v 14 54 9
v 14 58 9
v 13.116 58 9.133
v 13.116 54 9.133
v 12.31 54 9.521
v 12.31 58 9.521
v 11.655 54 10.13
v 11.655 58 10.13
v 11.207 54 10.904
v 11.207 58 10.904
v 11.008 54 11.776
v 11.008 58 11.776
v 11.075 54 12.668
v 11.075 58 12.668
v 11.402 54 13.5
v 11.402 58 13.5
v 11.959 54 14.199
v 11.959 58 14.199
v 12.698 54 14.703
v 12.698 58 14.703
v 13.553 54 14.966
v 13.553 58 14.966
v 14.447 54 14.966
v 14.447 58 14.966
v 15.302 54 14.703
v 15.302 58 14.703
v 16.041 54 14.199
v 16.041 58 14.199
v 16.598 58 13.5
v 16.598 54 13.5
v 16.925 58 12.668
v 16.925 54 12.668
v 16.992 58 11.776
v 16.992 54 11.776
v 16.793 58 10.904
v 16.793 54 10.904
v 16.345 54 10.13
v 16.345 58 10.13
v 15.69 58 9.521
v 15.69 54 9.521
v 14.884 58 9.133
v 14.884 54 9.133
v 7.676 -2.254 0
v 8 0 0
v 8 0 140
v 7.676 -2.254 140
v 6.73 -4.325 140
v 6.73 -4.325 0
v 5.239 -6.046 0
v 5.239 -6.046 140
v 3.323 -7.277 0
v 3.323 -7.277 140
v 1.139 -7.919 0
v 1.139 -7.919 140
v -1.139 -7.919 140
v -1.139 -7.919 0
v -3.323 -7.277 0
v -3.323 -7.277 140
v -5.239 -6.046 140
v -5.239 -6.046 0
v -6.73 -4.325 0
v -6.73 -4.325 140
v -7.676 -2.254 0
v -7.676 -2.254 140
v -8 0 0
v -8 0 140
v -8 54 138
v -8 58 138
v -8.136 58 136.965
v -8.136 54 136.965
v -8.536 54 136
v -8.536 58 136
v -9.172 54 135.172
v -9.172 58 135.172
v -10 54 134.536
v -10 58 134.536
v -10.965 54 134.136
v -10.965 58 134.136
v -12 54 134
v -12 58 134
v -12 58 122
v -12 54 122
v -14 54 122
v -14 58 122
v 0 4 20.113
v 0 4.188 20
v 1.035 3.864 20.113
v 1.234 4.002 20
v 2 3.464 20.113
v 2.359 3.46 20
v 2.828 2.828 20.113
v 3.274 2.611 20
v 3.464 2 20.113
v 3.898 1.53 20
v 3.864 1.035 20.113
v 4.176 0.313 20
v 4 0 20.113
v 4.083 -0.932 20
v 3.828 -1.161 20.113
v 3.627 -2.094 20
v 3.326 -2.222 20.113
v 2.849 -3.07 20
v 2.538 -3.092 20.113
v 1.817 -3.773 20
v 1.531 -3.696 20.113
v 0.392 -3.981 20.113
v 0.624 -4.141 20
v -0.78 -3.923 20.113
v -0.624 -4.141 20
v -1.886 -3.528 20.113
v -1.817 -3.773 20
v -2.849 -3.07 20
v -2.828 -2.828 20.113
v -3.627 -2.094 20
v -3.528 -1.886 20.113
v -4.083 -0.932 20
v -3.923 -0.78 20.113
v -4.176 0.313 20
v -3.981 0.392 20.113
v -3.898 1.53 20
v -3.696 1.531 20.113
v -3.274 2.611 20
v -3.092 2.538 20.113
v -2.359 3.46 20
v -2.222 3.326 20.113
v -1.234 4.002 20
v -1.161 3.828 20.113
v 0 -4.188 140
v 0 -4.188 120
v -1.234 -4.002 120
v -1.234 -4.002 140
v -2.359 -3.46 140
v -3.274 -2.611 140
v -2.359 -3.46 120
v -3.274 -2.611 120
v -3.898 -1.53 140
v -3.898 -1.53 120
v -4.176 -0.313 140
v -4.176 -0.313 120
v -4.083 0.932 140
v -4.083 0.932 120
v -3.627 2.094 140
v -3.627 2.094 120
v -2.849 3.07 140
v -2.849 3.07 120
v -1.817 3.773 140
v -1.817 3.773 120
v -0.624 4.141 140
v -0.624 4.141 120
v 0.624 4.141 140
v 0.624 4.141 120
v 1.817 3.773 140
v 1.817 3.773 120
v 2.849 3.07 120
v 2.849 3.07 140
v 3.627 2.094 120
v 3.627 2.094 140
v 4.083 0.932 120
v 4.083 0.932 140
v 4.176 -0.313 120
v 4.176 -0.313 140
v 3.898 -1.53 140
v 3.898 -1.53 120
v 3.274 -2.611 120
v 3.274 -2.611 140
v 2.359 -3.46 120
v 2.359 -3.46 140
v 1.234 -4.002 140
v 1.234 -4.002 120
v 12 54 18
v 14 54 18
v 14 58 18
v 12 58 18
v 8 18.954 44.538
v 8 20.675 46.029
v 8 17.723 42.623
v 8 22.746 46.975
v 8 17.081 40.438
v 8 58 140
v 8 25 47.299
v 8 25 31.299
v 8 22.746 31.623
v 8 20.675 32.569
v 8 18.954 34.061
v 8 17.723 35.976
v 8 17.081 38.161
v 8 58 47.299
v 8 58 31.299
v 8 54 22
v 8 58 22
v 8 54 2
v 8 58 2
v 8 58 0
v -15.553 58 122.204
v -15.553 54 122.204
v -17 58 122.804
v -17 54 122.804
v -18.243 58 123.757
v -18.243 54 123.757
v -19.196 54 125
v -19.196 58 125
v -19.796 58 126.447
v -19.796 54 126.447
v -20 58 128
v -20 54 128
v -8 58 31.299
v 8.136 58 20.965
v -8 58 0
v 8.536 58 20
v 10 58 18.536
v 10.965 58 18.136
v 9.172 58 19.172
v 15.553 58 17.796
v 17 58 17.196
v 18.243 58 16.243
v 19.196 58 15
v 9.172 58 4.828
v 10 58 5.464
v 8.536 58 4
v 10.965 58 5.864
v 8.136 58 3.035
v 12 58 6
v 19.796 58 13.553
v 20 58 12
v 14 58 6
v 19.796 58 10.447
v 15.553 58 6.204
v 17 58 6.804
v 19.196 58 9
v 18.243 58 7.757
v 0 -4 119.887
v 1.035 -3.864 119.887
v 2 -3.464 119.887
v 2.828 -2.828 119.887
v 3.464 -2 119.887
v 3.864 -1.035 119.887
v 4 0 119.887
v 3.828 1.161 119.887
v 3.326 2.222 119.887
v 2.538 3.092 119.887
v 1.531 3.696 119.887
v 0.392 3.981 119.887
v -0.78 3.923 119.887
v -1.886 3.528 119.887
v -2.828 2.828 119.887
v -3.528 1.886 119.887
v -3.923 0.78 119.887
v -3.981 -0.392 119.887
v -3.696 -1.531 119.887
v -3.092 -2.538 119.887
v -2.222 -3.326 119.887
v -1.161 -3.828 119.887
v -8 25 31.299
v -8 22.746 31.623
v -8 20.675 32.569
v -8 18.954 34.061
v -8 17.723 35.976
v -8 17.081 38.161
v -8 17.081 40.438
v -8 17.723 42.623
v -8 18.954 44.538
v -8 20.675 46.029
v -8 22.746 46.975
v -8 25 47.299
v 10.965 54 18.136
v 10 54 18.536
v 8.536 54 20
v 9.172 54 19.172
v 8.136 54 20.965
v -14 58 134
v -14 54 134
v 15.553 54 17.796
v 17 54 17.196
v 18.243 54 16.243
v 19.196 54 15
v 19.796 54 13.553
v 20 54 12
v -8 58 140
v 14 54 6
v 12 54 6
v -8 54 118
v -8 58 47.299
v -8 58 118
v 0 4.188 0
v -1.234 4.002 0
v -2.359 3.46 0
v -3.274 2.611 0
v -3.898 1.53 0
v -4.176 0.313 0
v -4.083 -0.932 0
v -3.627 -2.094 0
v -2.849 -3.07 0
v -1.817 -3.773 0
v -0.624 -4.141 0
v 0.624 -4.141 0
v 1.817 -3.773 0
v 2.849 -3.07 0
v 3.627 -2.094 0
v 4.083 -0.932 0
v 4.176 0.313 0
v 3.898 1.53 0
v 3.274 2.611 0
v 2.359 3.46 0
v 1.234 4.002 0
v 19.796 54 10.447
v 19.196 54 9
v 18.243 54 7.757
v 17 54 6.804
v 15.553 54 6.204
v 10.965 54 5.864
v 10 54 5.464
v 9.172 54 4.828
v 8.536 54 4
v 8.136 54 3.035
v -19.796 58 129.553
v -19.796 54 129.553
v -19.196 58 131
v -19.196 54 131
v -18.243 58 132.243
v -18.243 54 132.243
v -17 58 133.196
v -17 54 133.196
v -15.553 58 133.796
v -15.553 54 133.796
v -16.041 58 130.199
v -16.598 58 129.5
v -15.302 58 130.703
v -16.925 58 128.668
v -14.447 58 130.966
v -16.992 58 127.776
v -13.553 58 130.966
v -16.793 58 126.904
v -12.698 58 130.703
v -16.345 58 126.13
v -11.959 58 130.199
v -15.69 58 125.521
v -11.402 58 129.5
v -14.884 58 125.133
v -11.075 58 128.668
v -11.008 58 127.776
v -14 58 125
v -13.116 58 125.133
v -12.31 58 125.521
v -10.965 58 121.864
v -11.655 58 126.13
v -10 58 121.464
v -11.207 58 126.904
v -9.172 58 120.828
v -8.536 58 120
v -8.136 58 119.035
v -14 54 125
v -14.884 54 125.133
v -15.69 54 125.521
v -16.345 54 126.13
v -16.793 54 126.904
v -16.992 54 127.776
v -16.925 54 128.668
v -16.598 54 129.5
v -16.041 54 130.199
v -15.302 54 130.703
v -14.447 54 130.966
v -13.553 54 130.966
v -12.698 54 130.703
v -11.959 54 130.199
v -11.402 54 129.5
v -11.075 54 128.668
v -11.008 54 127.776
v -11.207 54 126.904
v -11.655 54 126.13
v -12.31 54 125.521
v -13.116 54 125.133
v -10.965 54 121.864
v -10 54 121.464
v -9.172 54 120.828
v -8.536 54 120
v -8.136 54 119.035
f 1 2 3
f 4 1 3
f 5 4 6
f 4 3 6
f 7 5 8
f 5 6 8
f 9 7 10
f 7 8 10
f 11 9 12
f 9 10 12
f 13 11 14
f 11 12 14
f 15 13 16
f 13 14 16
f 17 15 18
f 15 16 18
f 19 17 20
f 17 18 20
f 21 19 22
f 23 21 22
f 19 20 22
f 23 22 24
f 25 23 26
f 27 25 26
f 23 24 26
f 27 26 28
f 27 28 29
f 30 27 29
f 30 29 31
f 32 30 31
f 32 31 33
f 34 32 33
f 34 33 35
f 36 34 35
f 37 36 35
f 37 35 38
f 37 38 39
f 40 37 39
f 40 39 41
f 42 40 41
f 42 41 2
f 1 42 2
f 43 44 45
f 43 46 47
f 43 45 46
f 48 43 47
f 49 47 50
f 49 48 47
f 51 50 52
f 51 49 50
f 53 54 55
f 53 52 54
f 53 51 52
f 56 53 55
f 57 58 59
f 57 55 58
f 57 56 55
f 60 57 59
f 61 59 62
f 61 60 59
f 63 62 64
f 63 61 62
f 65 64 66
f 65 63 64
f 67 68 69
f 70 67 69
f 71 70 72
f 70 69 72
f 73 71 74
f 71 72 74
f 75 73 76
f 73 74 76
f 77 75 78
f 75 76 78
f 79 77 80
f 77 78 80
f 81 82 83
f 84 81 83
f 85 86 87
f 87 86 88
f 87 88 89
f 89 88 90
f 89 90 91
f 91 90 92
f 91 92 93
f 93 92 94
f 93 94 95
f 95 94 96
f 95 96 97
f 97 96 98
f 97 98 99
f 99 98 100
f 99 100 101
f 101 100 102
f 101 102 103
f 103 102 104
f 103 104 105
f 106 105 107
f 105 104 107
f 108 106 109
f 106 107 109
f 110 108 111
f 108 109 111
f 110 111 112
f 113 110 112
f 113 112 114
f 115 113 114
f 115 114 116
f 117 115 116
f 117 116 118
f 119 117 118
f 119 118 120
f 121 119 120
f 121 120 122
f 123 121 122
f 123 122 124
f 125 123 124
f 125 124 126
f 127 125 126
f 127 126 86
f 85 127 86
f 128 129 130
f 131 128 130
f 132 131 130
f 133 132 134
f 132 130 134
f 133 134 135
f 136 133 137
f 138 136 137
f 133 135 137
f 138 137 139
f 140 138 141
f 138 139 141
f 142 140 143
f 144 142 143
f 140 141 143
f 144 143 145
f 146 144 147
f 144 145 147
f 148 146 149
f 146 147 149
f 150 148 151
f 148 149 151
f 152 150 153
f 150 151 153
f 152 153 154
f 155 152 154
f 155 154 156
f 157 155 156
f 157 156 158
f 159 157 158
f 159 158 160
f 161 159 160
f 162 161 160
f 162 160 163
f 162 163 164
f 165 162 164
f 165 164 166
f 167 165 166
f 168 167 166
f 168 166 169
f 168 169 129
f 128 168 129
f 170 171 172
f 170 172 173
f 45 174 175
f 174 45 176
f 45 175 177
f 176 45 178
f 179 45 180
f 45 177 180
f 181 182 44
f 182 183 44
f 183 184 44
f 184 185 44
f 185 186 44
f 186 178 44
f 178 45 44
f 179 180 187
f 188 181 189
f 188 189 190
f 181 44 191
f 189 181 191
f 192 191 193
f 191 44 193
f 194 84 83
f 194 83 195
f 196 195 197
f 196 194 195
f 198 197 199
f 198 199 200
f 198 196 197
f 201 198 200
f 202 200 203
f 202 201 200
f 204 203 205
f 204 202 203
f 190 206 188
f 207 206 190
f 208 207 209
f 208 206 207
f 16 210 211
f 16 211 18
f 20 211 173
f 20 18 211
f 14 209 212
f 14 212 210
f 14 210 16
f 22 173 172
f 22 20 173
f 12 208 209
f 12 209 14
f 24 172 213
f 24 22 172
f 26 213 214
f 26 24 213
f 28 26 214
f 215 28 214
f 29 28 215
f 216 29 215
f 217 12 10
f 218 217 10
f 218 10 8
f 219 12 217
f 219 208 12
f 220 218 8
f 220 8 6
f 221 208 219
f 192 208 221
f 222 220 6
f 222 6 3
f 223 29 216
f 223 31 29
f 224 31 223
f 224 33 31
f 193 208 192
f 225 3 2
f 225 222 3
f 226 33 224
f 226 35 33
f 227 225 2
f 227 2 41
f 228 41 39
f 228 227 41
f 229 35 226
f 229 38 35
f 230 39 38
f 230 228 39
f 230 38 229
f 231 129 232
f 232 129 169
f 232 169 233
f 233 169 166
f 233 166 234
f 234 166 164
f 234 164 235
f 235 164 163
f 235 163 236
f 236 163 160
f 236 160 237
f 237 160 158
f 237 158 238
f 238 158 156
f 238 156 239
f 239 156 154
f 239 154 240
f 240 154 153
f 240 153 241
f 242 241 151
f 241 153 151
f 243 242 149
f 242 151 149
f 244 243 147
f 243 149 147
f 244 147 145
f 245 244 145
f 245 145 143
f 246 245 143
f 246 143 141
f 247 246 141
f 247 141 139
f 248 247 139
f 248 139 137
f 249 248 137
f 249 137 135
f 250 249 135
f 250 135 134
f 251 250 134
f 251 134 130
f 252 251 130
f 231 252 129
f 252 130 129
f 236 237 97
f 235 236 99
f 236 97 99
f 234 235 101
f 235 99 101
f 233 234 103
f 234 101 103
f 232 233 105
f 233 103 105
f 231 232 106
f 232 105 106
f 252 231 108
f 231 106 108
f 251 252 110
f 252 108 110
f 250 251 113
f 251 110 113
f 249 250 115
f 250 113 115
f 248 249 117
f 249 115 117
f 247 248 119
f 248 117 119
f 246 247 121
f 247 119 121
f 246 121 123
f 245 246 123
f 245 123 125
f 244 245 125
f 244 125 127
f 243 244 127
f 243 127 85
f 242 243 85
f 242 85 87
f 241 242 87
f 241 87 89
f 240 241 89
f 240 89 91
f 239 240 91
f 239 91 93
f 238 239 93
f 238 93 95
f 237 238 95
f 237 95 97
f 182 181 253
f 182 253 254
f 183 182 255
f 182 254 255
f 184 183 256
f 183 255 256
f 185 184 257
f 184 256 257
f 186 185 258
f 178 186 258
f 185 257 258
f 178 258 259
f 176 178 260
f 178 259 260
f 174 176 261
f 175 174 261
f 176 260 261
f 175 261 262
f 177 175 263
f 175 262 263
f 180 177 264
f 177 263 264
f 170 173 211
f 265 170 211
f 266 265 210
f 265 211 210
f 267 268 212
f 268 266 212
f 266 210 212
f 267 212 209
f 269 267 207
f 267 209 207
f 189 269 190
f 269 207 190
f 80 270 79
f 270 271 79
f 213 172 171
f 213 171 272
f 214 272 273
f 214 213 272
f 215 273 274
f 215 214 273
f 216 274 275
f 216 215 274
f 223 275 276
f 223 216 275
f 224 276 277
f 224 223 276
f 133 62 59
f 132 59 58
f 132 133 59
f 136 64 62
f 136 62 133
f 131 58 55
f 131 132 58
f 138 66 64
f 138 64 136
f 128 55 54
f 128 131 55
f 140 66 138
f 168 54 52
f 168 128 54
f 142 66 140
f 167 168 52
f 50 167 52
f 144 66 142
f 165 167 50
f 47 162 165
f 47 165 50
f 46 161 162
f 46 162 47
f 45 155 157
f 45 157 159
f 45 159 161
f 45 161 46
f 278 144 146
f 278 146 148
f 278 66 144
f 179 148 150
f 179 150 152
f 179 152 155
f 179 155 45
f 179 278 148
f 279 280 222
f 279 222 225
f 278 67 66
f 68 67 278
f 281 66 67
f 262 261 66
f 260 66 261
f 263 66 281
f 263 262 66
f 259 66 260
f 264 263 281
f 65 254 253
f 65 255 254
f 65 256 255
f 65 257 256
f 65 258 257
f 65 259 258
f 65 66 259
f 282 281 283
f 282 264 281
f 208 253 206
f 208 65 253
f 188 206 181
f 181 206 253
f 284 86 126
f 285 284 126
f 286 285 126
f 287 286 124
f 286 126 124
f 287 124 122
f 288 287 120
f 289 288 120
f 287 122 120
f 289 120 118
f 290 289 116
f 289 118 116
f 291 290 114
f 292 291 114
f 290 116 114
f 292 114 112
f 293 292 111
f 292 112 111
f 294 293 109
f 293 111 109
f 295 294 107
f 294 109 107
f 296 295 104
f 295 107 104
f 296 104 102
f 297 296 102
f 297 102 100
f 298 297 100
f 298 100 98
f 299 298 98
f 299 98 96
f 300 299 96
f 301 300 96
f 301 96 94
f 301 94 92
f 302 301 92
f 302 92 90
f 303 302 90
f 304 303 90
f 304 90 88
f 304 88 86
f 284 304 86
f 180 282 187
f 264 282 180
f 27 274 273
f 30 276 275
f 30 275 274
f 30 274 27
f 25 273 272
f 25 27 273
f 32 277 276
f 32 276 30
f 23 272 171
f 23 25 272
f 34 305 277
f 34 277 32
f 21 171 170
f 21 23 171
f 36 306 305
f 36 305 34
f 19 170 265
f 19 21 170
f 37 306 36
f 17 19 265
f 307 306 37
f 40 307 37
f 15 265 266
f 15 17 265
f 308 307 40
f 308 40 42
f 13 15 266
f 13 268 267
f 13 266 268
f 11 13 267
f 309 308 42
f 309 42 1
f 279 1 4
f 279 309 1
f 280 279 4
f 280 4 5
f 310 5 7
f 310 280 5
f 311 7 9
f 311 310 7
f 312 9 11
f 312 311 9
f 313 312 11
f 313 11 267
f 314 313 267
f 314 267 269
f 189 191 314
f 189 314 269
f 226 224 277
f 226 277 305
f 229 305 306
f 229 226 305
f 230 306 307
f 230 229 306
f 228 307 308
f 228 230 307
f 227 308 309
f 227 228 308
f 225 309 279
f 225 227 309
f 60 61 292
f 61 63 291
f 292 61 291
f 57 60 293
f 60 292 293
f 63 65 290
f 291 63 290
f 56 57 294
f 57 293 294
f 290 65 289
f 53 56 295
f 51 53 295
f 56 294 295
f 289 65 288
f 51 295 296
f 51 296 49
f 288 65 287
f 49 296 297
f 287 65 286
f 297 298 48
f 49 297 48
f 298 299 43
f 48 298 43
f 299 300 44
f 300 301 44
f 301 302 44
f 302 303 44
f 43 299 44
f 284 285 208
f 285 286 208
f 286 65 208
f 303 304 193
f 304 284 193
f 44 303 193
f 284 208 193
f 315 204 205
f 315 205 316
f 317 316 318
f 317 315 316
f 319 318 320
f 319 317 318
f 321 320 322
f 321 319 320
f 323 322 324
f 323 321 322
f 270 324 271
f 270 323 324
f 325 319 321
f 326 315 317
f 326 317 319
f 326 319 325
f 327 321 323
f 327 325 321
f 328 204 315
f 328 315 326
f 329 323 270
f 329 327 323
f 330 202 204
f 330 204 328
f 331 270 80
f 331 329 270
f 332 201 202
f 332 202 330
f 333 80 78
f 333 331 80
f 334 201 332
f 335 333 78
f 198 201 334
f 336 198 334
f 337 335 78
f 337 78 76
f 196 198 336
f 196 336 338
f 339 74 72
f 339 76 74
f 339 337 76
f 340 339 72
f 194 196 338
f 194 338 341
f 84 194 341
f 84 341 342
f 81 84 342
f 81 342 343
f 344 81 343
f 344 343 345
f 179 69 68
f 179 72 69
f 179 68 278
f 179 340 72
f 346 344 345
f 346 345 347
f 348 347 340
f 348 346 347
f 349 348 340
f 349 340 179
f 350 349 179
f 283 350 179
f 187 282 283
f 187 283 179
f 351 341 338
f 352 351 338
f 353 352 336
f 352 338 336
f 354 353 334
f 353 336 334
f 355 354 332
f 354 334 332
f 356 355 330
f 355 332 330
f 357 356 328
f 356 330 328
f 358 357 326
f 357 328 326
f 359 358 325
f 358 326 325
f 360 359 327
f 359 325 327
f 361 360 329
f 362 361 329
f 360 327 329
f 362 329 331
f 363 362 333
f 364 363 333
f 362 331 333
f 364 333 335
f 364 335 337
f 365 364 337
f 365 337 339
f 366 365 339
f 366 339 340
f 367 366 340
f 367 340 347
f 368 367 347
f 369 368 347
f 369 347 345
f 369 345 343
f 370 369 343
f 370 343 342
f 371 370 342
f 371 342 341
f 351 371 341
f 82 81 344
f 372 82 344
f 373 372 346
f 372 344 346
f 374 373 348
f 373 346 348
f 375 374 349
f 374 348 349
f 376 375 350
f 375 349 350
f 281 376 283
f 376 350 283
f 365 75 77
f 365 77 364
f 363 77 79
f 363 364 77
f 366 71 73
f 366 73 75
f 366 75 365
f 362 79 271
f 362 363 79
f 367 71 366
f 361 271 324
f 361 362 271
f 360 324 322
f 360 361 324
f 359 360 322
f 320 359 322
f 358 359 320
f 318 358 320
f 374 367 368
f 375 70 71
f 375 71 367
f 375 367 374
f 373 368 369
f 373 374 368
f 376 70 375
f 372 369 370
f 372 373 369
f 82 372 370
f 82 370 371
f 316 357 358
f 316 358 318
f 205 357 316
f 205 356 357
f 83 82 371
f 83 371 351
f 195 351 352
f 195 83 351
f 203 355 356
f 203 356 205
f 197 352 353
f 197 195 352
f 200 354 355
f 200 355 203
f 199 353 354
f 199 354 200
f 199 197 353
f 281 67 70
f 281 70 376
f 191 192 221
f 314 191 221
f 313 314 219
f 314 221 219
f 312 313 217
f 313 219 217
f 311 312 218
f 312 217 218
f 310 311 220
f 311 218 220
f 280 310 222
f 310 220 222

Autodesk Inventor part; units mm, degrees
ref_plane "YZ Plane" through (0, 0, 0) normal (1, 0, 0) x (0, 1, 0)
ref_plane "XZ Plane" through (0, 0, 0) normal (0, 1, 0) x (-1, 0, 0)
ref_plane "XY Plane" through (0, 0, 0) normal (0, 0, 1) x (1, 0, 0)
sketch "Sketch7" plane through (0, 0, 0) normal (0, 0, 1) x (1, 0, 0)
  circle A0 centre (0, 0) radius 4
  arc A1 (-8, 0) -> (8, 0) centre (0, 0) ccw
  line L0 (-8, 54) -> (-20, 54)
  line L1 (-20, 54) -> (-20, 58)
  line L2 (-20, 58) -> (0, 58)
  line L3 (0, 58) -> (20, 58)
  line L4 (20, 58) -> (20, 54)
  line L5 (20, 54) -> (8, 54)
  line L6 (-8, 0) -> (-8, 54)
  line L7 (8, 0) -> (8, 54)
  dimension "d34" = 4
  dimension "d35" = 58
  dimension "d36" = 8
  dimension "d37" = 4
  dimension "d38" = 12
extrude "Extrusion6" add sketch "Sketch7" along normal blind 140
sketch "Sketch8" plane through (-20, 54, 0) normal (0, -1, 0) x (1, 0, 0)
  line L0 (12, 140) -> (0, 140) projected
  line L1 (0, 0) -> (0, 140) projected
  line L2 (0, 0) -> (12, 0) projected
  line L3 (12, 0) -> (12, 140) projected
  line L4 (40, 140) -> (28, 140) projected
  line L5 (28, 0) -> (28, 140) projected
  line L6 (28, 0) -> (40, 0) projected
  line L7 (40, 0) -> (40, 140) projected
  line L8 (0, 134) -> (12, 134)
  line L9 (12, 134) -> (12, 122)
  line L10 (12, 122) -> (0, 122)
  line L11 (0, 122) -> (0, 134)
  line L12 (28, 6) -> (40, 6)
  line L13 (40, 6) -> (40, 18)
  line L14 (40, 18) -> (28, 18)
  line L15 (28, 18) -> (28, 6)
  point P0 (20, 0)
  dimension "d41" = 12
  dimension "d42" = 6
  dimension "d43" = 6
extrude "Extrusion7" cut sketch "Sketch8" against normal blind 140 contours L3 L8 L1 L0 | L3 L2 L1 L10 | L7 L14 L5 L4 | L7 L6 L5 L12
fillet "Fillet1" radius 6 4 edges at (20, 56, 6) (20, 56, 18) (-20, 56, 134) (-20, 56, 122)
fillet "Fillet1" radius 4 4 edges at (-8, 56, 134) (-8, 56, 122) (8, 56, 6) (8, 56, 18)
sketch "Sketch9" plane through (-14, 54, 122) normal (0, -1, 0) x (1, 0, 0)
  arc A0 (0, 12) -> (0, 0) centre (0, 6) ccw projected
  arc A1 (28, -116) -> (28, -104) centre (28, -110) ccw projected
  line L0 (28, -104) -> (26, -104) projected
  arc A2 (22, -100) -> (26, -104) centre (26, -100) ccw projected
  line L1 (22, -120) -> (22, -100) projected
  arc A3 (26, -116) -> (22, -120) centre (26, -120) ccw projected
  line L2 (26, -116) -> (28, -116) projected
  point P0 (14, -122)
hole "Hole2" at (14, 54, 12) at (-14, 54, 128) direction (0, 1, 0) diameter 6 depth 8 tip angle 118 clearance for "Flat Head Machine Screw" size "M6" standard "Ansi Metric M Profile"
sketch "Sketch10" plane through (0, 0, 140) normal (0, 0, 1) x (1, 0, 0)
  arc A0 (-8, 0) -> (8, 0) centre (0, 0) ccw projected
hole "Hole3" at (0, 0, 140) direction (0, 0, -1) diameter 8.376 depth 20 tip angle 118 thread size "M10x1.5" class "6H" standard "ANSI Metric M Profile"
sketch "Sketch11" plane through (0, 0, 0) normal (0, 0, -1) x (-1, 0, 0)
  arc A0 (-8, 0) -> (8, 0) centre (0, 0) ccw projected
hole "Hole4" at (0, 0, 0) direction (0, 0, 1) diameter 8.376 depth 20 tip angle 118 thread size "M10x1.5" class "6H" standard "ANSI Metric M Profile"
ref_plane "Work Plane3" through (0, 0, 140) normal (1, 0, 0) x (0, 0, -1)
sketch "Sketch12" plane through (-8, 0, 0) normal (-1, 0, 0) x (0, 0, 1)
  line L0 (0, 58) -> (118, 58) projected
  arc A0 (31.2994, 25) -> (47.2994, 25) centre (39.2994, 25) ccw projected
  line L1 (47.2994, 58) -> (47.2994, 25) projected
  line L2 (31.2994, 58) -> (31.2994, 25) projected
  circle A1 centre (39.2994, 25) radius 8
  line L3 (31.2994, 25) -> (31.2994, 58)
  line L4 (47.2994, 25) -> (47.2994, 58)
extrude "Extrusion8" cut sketch "Sketch12" against normal through all
properties part number "Pusher.Holder2" material "Aluminum-6061"
